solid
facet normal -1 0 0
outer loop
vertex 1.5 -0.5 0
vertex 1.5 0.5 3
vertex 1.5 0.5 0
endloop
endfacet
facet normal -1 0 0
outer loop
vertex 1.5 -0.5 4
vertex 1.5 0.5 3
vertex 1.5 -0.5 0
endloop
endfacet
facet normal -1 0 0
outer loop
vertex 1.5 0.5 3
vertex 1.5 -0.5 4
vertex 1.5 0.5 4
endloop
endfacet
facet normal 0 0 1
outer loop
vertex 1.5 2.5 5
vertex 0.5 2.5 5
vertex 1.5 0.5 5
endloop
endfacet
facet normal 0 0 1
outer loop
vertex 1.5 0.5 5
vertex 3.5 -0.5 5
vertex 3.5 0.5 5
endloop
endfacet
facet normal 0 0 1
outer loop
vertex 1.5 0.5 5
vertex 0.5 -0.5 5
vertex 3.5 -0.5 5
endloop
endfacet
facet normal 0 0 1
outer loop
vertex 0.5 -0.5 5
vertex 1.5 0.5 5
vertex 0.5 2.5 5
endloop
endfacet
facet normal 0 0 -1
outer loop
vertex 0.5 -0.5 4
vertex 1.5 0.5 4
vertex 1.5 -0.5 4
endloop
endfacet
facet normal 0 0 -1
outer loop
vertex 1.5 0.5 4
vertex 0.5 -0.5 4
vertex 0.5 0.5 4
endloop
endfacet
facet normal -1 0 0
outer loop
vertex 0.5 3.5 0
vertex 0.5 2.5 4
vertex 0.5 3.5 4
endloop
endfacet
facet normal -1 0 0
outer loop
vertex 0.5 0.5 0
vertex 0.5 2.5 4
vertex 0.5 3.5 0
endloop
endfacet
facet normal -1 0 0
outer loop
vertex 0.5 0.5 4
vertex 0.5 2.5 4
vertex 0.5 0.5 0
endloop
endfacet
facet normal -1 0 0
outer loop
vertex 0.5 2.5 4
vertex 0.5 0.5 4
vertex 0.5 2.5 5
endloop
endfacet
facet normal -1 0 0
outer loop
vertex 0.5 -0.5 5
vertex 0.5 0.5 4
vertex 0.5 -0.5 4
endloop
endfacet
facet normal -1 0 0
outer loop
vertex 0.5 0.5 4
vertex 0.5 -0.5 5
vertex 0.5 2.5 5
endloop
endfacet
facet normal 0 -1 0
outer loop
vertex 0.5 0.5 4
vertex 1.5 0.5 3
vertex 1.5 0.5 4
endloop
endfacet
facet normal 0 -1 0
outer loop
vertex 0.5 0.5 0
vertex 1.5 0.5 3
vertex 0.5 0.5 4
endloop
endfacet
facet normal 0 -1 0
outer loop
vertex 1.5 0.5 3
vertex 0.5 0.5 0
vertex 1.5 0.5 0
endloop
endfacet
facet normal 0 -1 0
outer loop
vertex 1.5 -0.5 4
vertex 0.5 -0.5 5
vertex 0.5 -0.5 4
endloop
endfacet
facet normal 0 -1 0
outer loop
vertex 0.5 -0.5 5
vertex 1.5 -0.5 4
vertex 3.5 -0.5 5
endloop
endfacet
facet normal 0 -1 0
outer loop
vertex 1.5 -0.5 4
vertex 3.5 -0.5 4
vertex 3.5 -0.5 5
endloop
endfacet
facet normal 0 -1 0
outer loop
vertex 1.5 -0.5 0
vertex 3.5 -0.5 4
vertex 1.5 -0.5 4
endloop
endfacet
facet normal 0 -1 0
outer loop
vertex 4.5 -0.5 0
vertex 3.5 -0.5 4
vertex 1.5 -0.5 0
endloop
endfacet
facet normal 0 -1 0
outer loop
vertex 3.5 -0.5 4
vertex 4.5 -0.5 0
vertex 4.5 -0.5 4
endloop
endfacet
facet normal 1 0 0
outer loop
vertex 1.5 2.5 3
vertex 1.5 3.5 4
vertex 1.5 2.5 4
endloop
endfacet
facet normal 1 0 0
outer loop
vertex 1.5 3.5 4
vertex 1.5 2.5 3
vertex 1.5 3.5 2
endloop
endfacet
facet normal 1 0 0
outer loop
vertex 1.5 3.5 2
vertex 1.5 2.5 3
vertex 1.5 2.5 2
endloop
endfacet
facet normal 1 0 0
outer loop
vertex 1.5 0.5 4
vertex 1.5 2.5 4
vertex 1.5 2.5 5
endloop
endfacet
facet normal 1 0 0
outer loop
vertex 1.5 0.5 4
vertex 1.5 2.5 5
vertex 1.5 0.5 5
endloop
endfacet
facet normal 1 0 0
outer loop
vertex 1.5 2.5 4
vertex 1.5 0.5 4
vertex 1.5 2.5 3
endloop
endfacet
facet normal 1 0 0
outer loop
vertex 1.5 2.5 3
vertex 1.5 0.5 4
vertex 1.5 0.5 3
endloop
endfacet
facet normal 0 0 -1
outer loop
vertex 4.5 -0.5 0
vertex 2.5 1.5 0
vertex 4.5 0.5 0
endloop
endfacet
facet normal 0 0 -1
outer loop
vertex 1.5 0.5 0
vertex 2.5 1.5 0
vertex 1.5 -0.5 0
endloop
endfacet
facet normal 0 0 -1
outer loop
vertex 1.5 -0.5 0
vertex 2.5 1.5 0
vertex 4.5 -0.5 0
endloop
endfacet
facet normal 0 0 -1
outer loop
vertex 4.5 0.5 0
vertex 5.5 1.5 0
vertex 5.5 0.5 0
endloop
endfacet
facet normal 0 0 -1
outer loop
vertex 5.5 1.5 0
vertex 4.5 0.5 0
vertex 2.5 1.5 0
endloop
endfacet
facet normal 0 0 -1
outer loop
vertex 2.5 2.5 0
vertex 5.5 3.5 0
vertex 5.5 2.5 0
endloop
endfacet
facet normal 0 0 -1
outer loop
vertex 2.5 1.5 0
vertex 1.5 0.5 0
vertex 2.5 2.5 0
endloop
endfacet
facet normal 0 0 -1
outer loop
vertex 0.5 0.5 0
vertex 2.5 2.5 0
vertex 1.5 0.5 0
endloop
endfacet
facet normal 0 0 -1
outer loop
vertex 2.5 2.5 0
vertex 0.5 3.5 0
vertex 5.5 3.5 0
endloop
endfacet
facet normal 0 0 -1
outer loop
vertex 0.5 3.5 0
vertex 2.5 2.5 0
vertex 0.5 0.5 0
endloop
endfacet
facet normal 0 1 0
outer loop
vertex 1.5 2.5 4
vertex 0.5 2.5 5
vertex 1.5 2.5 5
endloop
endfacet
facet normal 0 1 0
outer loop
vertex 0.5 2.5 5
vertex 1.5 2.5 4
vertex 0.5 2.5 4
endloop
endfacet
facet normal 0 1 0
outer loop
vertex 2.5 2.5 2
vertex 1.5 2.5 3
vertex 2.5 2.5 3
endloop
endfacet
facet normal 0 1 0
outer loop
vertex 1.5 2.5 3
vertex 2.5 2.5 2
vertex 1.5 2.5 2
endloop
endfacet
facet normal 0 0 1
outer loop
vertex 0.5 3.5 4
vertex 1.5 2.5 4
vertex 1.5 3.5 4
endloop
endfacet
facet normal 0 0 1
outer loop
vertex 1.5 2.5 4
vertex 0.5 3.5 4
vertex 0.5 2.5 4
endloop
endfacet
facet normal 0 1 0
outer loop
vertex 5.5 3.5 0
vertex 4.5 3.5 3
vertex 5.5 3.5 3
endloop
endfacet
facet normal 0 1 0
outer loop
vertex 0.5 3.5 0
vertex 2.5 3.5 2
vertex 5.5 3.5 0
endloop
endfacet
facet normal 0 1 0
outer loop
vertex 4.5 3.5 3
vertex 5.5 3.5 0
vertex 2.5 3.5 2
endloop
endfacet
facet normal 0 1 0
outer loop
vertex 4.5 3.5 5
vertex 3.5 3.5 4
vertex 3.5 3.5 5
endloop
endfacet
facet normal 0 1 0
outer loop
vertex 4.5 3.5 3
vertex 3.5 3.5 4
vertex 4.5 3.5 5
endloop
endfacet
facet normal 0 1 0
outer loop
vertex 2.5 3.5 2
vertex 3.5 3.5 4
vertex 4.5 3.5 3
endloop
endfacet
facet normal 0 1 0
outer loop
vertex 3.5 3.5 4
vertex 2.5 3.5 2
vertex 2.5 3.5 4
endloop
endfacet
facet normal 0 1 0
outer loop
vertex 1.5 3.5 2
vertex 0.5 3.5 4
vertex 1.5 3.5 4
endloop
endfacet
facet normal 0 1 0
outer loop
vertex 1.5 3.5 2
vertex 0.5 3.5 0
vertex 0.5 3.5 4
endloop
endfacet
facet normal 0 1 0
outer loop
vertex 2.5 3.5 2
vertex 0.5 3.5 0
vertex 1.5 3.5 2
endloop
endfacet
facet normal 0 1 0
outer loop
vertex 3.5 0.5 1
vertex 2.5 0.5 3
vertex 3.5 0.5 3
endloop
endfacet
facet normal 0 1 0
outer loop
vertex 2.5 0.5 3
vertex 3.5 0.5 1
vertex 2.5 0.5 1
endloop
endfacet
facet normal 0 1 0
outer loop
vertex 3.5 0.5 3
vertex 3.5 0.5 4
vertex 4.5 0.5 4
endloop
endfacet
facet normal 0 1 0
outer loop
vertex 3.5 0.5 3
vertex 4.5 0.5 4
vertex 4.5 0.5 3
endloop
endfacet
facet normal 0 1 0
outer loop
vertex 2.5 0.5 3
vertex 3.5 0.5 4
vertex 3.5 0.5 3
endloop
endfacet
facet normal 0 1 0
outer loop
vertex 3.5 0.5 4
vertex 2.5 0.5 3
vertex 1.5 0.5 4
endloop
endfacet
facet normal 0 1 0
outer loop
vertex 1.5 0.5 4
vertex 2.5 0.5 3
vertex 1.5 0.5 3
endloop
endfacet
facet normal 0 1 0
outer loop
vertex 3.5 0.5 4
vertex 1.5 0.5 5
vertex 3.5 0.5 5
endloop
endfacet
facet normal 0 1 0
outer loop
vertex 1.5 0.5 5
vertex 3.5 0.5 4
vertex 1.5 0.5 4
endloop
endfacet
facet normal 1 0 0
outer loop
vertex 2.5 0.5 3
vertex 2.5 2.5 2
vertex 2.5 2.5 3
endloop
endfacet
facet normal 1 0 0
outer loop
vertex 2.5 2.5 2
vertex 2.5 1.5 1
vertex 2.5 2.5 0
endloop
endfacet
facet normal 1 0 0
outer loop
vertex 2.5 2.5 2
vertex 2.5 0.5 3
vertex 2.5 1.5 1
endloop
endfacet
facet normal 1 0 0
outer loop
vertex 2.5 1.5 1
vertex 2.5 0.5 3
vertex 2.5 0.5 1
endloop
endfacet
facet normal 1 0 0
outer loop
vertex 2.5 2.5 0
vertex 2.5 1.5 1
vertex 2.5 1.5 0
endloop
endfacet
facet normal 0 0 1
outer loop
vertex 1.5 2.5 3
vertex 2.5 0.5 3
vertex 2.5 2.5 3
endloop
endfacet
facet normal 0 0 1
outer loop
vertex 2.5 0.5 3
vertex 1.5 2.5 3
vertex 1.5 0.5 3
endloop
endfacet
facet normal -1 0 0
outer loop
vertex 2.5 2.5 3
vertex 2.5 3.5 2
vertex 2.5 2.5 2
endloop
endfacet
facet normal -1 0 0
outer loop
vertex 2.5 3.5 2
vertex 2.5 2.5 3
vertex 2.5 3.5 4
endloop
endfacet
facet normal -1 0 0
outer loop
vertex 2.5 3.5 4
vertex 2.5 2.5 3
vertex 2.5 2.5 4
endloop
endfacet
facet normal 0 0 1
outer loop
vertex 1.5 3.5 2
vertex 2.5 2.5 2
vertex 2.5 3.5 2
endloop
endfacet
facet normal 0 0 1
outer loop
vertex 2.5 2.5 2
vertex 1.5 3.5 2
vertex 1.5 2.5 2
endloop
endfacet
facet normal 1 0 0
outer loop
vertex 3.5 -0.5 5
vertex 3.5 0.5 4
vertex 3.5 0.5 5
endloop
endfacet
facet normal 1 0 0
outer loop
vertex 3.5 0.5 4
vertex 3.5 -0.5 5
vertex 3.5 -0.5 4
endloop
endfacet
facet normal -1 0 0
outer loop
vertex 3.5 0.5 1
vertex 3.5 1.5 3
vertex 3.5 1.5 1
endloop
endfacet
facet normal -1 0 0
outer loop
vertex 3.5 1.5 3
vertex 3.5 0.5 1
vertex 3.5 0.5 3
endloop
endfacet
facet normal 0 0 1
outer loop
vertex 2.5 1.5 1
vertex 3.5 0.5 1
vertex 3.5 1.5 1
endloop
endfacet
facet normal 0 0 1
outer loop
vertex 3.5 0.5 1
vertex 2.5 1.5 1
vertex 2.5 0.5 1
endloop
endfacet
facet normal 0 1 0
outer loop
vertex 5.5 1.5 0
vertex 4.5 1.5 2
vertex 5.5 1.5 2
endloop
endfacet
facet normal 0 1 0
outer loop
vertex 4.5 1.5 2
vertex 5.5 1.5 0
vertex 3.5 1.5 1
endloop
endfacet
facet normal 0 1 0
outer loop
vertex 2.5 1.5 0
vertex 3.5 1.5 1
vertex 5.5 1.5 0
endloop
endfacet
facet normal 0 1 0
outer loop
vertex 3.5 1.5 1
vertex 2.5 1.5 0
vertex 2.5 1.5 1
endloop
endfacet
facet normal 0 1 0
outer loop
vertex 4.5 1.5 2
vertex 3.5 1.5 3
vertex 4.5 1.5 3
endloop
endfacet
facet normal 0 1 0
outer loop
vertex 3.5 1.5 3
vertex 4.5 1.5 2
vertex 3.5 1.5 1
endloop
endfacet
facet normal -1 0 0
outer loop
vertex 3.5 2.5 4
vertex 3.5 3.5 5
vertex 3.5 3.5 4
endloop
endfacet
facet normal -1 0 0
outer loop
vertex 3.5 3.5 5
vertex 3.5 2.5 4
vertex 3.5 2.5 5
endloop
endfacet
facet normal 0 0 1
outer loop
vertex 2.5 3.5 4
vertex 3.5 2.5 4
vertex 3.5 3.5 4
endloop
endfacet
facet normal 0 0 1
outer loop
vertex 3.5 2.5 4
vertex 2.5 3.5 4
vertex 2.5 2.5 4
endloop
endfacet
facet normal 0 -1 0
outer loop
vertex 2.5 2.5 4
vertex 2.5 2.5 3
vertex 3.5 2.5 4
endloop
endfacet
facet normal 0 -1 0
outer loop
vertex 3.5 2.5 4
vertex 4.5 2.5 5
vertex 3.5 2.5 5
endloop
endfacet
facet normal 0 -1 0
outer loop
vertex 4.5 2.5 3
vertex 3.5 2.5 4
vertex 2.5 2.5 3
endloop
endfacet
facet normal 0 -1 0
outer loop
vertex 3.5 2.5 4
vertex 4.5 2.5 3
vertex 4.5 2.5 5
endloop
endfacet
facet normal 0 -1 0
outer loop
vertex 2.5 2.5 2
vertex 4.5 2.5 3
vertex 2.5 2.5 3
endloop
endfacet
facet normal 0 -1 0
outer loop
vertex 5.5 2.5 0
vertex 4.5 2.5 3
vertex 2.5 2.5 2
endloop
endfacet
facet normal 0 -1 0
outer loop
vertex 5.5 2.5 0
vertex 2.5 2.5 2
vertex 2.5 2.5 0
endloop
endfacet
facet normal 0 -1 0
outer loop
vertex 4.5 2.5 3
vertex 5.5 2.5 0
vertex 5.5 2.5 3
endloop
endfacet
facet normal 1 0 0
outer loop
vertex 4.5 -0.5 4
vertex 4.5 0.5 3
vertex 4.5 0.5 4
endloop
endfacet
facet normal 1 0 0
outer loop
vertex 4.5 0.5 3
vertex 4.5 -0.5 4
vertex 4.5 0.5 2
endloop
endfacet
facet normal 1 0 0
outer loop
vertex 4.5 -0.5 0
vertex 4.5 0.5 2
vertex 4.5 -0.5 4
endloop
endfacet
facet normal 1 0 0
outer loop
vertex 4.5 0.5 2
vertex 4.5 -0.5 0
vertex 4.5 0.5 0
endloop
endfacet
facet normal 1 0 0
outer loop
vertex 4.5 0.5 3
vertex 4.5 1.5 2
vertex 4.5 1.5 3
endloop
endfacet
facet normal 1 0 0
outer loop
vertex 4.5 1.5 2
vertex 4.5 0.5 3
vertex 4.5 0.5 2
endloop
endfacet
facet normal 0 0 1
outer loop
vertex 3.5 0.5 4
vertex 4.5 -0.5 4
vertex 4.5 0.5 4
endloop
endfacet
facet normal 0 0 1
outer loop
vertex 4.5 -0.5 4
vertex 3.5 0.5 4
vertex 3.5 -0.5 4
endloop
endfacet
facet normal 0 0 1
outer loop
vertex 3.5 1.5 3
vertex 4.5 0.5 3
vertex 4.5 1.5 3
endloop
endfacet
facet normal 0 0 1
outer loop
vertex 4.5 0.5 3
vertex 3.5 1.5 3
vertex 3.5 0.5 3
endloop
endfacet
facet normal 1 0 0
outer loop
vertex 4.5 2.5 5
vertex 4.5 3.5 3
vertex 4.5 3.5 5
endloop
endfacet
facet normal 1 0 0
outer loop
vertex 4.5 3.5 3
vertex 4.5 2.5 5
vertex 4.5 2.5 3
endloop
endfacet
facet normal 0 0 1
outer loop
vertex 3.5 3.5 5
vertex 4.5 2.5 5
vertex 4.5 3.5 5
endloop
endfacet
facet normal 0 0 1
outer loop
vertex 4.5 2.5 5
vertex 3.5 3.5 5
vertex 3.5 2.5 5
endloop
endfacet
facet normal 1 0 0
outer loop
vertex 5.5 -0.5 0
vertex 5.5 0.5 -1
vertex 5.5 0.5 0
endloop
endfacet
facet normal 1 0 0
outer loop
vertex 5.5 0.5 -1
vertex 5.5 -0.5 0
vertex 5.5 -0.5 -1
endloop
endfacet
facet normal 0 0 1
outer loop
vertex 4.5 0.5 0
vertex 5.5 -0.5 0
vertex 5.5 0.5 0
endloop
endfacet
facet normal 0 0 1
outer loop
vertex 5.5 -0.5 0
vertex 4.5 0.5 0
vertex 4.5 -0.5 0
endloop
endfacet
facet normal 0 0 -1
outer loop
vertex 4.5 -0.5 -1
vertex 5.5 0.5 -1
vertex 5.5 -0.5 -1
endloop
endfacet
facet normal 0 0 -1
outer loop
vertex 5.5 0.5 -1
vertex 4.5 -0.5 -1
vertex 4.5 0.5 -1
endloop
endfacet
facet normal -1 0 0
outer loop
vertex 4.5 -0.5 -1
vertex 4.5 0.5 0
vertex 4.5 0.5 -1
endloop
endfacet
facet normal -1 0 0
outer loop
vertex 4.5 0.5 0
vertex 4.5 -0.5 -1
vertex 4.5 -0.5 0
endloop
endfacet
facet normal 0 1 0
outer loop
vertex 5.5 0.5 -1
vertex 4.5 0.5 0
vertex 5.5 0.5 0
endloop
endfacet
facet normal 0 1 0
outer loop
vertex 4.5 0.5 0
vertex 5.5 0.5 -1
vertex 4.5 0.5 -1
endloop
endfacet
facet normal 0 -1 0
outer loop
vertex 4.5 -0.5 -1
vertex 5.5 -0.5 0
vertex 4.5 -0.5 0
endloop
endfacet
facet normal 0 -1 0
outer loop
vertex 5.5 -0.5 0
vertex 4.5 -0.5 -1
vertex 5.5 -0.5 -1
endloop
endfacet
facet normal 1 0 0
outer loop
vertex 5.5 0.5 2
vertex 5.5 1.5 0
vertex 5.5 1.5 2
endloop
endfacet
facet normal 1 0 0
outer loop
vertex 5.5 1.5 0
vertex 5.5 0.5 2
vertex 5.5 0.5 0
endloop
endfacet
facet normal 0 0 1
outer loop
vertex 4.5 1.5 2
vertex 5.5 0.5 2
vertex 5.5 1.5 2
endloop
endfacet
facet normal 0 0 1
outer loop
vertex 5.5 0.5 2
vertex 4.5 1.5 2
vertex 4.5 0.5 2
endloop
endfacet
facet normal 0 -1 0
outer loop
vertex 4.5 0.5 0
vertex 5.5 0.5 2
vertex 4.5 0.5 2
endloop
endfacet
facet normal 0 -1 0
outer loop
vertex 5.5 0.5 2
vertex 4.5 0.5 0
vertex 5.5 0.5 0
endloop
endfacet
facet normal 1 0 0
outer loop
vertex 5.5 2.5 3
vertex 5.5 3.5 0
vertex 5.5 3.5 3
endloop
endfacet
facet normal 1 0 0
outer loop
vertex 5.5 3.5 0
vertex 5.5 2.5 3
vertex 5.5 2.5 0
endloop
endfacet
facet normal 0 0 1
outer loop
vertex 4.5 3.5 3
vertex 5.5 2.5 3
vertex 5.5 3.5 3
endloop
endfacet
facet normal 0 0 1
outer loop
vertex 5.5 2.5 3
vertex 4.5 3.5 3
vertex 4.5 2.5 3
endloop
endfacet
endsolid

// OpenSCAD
union() {
    translate([1, 0, 4.5]) color([1, 0, 0]) cube([1, 1, 1], center=true);
    translate([1, 1, 2.5]) cube([1, 1, 5], center=true);
    translate([1, 2, 2.5]) cube([1, 1, 5], center=true);
    translate([1, 3, 2.0]) cube([1, 1, 4], center=true);
    translate([2, 0, 2.5]) cube([1, 1, 5], center=true);
    translate([2, 1, 1.5]) cube([1, 1, 3], center=true);
    translate([2, 2, 1.5]) cube([1, 1, 3], center=true);
    translate([2, 3, 1.0]) cube([1, 1, 2], center=true);
    translate([3, 0, 2.5]) cube([1, 1, 5], center=true);
    translate([3, 1, 0.5]) cube([1, 1, 1], center=true);
    translate([3, 3, 2.0]) cube([1, 1, 4], center=true);
    translate([4, 0, 2.0]) cube([1, 1, 4], center=true);
    translate([4, 1, 1.5]) cube([1, 1, 3], center=true);
    translate([4, 3, 2.5]) cube([1, 1, 5], center=true);
    translate([5, 0, -0.5]) color([0, 0, 1]) cube([1, 1, 1], center=true);
    translate([5, 1, 1.0]) cube([1, 1, 2], center=true);
    translate([5, 3, 1.5]) cube([1, 1, 3], center=true);
}
